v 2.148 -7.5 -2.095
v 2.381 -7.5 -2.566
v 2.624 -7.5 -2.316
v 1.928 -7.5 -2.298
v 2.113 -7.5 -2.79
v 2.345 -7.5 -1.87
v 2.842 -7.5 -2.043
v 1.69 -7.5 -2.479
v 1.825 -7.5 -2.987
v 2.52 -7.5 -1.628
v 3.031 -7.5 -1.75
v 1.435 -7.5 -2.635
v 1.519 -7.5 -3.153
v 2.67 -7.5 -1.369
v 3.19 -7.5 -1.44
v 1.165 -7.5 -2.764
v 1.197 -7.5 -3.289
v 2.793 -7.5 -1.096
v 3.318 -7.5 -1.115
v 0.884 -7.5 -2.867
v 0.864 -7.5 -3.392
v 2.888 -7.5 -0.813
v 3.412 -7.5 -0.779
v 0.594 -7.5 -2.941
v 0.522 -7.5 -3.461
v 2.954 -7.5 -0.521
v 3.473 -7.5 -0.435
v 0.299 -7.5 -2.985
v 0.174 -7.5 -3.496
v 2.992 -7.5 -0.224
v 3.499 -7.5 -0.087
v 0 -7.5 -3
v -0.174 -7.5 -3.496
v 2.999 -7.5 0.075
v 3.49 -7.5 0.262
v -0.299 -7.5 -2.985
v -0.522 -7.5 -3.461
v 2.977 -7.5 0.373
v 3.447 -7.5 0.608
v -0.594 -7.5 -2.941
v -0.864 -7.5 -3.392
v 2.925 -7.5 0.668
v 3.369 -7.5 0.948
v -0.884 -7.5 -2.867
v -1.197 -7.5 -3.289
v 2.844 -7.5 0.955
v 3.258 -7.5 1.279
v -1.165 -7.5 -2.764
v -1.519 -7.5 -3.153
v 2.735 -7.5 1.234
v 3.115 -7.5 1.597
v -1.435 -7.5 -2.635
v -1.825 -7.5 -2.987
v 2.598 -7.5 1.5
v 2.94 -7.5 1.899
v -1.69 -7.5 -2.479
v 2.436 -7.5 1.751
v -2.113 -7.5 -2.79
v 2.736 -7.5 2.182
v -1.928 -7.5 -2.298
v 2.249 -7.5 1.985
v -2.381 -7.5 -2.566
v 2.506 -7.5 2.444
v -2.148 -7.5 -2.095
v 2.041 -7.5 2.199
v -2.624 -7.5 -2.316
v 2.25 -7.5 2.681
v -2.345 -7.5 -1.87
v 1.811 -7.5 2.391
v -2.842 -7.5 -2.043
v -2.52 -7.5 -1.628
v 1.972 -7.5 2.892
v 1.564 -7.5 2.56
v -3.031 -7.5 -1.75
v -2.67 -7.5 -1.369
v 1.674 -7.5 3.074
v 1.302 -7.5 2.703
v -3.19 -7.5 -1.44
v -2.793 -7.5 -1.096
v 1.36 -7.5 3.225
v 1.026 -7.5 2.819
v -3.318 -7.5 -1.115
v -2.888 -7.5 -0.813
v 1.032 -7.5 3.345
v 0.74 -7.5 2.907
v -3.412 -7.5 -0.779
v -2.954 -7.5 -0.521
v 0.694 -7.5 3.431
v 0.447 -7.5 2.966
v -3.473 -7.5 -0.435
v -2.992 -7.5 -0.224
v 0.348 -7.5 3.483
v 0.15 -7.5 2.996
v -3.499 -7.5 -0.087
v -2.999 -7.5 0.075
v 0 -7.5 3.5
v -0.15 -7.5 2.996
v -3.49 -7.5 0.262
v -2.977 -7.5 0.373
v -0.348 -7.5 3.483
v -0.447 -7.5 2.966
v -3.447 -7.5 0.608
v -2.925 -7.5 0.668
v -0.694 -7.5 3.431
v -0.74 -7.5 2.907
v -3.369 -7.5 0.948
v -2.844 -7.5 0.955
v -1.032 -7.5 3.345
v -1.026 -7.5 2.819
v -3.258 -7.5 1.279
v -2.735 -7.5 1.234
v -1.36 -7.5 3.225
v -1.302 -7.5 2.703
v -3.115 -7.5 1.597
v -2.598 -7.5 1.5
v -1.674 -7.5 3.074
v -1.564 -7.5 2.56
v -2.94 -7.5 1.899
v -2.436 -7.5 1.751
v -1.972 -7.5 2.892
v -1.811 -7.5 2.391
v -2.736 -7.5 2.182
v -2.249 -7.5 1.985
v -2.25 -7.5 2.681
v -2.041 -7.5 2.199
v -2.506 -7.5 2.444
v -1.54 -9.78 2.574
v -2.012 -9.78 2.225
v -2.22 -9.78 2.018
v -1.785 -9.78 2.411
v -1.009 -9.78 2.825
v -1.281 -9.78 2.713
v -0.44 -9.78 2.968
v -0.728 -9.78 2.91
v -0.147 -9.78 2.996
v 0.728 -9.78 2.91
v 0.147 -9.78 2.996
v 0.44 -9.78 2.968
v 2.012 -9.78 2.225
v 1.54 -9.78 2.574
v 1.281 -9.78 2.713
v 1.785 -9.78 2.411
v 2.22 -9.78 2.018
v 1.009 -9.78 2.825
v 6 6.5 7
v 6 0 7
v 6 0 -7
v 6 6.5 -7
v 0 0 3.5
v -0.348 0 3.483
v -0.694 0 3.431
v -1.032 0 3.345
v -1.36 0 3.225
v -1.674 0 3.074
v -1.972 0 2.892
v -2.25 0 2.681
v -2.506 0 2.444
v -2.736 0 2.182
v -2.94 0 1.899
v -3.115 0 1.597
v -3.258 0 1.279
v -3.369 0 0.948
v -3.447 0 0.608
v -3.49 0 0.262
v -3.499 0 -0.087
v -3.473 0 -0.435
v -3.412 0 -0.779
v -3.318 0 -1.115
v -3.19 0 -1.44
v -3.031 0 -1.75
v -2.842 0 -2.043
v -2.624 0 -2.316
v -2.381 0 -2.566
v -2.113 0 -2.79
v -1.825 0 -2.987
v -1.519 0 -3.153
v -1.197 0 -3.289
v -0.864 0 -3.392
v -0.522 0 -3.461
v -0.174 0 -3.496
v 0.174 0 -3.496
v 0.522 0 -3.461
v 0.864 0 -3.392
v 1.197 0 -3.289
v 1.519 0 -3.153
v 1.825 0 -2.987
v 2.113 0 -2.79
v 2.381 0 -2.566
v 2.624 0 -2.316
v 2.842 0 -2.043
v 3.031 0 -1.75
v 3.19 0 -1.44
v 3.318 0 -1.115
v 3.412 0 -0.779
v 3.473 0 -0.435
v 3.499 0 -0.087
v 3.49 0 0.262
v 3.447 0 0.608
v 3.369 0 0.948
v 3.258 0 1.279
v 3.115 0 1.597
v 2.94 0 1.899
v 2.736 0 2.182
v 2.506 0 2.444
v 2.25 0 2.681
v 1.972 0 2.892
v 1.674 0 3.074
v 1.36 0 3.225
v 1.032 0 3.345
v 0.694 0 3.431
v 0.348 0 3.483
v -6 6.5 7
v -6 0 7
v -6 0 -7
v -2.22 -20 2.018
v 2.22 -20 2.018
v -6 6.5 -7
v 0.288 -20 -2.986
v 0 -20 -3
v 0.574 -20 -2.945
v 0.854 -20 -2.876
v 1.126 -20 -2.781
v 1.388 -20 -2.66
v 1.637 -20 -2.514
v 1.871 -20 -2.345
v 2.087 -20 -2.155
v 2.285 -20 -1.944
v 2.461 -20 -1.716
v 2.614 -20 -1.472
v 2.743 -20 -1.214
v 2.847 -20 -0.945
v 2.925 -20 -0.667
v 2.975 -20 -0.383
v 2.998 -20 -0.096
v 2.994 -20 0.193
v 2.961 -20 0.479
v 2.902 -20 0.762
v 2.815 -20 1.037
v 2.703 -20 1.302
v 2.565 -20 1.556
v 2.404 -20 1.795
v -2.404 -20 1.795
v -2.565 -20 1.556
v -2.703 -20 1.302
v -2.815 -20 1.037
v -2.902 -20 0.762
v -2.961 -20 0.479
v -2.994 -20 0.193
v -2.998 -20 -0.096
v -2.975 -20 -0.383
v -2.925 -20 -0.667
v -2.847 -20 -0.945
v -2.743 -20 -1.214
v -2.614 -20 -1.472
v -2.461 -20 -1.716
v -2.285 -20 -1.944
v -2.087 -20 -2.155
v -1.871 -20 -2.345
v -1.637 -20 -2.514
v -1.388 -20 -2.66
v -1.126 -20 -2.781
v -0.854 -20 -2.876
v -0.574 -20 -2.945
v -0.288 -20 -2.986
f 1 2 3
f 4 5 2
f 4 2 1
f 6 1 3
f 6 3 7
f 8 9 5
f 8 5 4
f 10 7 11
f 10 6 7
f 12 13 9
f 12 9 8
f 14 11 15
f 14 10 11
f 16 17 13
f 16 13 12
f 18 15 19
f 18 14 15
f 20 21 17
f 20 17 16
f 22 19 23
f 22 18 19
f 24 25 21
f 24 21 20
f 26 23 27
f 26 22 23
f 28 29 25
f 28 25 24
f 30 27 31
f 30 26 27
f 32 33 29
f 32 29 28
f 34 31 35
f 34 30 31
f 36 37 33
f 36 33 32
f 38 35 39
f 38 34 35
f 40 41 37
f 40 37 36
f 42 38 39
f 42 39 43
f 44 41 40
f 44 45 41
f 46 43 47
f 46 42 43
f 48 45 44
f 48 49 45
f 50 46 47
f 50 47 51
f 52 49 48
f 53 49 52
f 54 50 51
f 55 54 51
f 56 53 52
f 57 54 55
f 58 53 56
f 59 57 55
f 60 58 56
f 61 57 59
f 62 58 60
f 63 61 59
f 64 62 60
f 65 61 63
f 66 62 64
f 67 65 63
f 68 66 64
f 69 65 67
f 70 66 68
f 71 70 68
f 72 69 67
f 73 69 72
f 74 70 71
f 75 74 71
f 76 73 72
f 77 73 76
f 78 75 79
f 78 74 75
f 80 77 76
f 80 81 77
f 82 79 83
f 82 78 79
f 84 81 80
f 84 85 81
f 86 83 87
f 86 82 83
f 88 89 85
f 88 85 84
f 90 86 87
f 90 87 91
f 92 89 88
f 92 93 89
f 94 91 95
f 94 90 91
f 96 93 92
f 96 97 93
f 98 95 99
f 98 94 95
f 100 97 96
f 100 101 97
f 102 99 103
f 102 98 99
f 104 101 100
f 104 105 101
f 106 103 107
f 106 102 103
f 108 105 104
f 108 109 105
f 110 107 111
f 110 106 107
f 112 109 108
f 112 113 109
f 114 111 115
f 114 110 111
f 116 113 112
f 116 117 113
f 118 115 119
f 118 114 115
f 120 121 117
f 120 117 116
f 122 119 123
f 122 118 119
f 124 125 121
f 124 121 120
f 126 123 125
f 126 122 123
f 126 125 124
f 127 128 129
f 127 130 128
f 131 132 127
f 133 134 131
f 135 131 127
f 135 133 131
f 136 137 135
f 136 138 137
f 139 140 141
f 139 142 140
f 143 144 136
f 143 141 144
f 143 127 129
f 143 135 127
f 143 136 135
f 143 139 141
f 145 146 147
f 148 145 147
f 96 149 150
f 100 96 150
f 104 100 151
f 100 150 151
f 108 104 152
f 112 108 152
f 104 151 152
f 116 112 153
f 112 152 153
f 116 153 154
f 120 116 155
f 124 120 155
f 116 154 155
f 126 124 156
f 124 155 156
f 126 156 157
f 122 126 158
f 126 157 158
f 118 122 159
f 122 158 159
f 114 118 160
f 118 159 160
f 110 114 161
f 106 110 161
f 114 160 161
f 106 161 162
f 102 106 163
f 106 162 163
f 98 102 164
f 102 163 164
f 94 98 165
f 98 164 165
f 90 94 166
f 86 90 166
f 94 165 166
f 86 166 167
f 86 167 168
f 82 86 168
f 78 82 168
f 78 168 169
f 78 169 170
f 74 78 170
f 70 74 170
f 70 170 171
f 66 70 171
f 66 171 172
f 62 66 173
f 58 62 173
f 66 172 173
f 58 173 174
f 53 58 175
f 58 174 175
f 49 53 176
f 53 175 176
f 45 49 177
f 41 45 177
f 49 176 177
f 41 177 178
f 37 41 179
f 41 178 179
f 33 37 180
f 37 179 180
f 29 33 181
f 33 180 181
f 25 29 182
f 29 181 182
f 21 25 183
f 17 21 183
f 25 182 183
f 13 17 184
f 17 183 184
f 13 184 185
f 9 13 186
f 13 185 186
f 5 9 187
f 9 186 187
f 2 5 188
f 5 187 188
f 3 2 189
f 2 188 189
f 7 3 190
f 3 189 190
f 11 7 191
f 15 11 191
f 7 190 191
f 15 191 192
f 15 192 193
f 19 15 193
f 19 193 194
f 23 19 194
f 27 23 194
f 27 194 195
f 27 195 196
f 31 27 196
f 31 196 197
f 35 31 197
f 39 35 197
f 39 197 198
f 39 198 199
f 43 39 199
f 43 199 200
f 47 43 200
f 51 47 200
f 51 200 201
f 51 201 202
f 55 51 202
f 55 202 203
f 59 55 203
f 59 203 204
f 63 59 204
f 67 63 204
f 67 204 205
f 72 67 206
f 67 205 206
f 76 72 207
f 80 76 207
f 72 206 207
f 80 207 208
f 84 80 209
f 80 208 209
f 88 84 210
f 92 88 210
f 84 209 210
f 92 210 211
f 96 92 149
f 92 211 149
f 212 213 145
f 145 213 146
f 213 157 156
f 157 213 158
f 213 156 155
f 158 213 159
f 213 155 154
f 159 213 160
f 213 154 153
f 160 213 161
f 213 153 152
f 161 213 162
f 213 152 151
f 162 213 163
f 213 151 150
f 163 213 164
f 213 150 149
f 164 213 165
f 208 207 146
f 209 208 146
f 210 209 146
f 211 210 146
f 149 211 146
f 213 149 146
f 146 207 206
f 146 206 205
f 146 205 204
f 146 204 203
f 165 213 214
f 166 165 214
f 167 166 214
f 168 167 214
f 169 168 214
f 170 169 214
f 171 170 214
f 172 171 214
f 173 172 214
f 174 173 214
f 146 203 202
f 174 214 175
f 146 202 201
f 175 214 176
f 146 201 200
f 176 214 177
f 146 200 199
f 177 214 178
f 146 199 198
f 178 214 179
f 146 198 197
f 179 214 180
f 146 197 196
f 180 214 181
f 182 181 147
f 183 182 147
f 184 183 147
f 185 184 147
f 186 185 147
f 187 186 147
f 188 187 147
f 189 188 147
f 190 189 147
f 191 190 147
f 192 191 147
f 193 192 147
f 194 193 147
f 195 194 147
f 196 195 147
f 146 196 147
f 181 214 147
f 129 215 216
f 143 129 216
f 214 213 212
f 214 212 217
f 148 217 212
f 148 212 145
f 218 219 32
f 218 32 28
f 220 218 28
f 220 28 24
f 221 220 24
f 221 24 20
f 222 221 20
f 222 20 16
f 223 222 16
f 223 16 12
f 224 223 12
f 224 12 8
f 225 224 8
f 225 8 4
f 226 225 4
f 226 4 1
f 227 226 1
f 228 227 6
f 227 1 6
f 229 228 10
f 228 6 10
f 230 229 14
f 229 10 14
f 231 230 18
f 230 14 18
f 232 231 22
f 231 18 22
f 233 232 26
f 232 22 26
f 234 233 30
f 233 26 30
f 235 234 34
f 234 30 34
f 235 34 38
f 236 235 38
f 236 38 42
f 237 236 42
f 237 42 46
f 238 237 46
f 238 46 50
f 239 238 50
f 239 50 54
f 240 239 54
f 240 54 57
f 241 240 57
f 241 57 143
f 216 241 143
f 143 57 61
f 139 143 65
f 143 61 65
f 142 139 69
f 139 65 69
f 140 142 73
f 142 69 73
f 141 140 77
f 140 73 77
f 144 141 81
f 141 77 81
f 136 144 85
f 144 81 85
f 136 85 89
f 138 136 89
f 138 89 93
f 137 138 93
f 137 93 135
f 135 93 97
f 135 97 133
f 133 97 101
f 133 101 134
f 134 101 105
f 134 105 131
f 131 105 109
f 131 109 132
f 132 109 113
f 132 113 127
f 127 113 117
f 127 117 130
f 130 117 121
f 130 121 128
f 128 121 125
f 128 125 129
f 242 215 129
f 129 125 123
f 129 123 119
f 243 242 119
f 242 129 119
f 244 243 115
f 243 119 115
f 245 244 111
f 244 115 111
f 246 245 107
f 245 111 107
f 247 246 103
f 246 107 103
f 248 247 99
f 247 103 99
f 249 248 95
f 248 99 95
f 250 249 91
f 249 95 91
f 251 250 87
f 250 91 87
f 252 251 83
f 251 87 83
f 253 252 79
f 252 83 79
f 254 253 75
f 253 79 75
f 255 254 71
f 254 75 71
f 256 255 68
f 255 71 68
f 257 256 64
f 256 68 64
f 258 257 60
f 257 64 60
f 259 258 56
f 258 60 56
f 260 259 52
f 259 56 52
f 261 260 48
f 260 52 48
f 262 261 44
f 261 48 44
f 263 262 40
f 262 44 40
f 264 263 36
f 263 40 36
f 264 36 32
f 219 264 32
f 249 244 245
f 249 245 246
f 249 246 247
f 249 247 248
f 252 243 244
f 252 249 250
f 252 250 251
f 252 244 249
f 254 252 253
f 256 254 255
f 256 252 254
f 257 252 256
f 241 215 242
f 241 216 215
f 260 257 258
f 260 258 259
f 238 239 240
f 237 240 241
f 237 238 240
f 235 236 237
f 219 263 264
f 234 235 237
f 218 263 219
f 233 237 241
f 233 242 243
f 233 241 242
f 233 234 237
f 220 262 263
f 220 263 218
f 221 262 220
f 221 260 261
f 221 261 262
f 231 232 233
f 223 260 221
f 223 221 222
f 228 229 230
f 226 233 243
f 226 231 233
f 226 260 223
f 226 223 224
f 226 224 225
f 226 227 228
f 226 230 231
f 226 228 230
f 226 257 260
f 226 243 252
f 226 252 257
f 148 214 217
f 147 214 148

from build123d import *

# Parameters (mm, degrees)
SKETCH1_W           = 12
SKETCH1_H           = 14
BOSS_EXTRUDE1_DEPTH = 6.5
SKETCH2_R           = 3.5
BOSS_EXTRUDE2_DEPTH = 7.5
SKETCH3_R           = 3
BOSS_EXTRUDE3_DEPTH = 12.5
CUT_EXTRUDE1_START  = -10.22
CUT_EXTRUDE1_DEPTH  = 10.22


with BuildPart() as part:
    # Sketch1 → Boss-Extrude1 (new body)
    with BuildSketch(Plane(origin=(0, 0, 0), x_dir=(1, 0, 0), z_dir=(0, 1, 0))):
        Rectangle(SKETCH1_W, SKETCH1_H)
    extrude(amount=BOSS_EXTRUDE1_DEPTH)

    # Sketch2 → Boss-Extrude2 (add)
    with BuildSketch(Plane.XZ):
        with Locations(Location((0, 0, 0), (0, 0, 90))):
            Circle(SKETCH2_R)
    extrude(amount=BOSS_EXTRUDE2_DEPTH)

    # Sketch3 → Boss-Extrude3 (add)
    with BuildSketch(Plane.XZ.offset(7.5)):
        with Locations(Location((0, 0, 0), (0, 0, 270))):
            Circle(SKETCH3_R)
    extrude(amount=BOSS_EXTRUDE3_DEPTH)

    # Sketch4 → Cut-Extrude1 (cut)
    with BuildSketch(Plane.XZ.offset(20).offset(CUT_EXTRUDE1_START)):
        with BuildLine():
            Line((-2.86, 2.017523234), (2.86, 2.017523234))
            ThreePointArc((2.86, 2.017523234), (0, 3.5), (-2.86, 2.017523234))
        make_face()
    extrude(amount=CUT_EXTRUDE1_DEPTH, mode=Mode.SUBTRACT)


solid = part.part
